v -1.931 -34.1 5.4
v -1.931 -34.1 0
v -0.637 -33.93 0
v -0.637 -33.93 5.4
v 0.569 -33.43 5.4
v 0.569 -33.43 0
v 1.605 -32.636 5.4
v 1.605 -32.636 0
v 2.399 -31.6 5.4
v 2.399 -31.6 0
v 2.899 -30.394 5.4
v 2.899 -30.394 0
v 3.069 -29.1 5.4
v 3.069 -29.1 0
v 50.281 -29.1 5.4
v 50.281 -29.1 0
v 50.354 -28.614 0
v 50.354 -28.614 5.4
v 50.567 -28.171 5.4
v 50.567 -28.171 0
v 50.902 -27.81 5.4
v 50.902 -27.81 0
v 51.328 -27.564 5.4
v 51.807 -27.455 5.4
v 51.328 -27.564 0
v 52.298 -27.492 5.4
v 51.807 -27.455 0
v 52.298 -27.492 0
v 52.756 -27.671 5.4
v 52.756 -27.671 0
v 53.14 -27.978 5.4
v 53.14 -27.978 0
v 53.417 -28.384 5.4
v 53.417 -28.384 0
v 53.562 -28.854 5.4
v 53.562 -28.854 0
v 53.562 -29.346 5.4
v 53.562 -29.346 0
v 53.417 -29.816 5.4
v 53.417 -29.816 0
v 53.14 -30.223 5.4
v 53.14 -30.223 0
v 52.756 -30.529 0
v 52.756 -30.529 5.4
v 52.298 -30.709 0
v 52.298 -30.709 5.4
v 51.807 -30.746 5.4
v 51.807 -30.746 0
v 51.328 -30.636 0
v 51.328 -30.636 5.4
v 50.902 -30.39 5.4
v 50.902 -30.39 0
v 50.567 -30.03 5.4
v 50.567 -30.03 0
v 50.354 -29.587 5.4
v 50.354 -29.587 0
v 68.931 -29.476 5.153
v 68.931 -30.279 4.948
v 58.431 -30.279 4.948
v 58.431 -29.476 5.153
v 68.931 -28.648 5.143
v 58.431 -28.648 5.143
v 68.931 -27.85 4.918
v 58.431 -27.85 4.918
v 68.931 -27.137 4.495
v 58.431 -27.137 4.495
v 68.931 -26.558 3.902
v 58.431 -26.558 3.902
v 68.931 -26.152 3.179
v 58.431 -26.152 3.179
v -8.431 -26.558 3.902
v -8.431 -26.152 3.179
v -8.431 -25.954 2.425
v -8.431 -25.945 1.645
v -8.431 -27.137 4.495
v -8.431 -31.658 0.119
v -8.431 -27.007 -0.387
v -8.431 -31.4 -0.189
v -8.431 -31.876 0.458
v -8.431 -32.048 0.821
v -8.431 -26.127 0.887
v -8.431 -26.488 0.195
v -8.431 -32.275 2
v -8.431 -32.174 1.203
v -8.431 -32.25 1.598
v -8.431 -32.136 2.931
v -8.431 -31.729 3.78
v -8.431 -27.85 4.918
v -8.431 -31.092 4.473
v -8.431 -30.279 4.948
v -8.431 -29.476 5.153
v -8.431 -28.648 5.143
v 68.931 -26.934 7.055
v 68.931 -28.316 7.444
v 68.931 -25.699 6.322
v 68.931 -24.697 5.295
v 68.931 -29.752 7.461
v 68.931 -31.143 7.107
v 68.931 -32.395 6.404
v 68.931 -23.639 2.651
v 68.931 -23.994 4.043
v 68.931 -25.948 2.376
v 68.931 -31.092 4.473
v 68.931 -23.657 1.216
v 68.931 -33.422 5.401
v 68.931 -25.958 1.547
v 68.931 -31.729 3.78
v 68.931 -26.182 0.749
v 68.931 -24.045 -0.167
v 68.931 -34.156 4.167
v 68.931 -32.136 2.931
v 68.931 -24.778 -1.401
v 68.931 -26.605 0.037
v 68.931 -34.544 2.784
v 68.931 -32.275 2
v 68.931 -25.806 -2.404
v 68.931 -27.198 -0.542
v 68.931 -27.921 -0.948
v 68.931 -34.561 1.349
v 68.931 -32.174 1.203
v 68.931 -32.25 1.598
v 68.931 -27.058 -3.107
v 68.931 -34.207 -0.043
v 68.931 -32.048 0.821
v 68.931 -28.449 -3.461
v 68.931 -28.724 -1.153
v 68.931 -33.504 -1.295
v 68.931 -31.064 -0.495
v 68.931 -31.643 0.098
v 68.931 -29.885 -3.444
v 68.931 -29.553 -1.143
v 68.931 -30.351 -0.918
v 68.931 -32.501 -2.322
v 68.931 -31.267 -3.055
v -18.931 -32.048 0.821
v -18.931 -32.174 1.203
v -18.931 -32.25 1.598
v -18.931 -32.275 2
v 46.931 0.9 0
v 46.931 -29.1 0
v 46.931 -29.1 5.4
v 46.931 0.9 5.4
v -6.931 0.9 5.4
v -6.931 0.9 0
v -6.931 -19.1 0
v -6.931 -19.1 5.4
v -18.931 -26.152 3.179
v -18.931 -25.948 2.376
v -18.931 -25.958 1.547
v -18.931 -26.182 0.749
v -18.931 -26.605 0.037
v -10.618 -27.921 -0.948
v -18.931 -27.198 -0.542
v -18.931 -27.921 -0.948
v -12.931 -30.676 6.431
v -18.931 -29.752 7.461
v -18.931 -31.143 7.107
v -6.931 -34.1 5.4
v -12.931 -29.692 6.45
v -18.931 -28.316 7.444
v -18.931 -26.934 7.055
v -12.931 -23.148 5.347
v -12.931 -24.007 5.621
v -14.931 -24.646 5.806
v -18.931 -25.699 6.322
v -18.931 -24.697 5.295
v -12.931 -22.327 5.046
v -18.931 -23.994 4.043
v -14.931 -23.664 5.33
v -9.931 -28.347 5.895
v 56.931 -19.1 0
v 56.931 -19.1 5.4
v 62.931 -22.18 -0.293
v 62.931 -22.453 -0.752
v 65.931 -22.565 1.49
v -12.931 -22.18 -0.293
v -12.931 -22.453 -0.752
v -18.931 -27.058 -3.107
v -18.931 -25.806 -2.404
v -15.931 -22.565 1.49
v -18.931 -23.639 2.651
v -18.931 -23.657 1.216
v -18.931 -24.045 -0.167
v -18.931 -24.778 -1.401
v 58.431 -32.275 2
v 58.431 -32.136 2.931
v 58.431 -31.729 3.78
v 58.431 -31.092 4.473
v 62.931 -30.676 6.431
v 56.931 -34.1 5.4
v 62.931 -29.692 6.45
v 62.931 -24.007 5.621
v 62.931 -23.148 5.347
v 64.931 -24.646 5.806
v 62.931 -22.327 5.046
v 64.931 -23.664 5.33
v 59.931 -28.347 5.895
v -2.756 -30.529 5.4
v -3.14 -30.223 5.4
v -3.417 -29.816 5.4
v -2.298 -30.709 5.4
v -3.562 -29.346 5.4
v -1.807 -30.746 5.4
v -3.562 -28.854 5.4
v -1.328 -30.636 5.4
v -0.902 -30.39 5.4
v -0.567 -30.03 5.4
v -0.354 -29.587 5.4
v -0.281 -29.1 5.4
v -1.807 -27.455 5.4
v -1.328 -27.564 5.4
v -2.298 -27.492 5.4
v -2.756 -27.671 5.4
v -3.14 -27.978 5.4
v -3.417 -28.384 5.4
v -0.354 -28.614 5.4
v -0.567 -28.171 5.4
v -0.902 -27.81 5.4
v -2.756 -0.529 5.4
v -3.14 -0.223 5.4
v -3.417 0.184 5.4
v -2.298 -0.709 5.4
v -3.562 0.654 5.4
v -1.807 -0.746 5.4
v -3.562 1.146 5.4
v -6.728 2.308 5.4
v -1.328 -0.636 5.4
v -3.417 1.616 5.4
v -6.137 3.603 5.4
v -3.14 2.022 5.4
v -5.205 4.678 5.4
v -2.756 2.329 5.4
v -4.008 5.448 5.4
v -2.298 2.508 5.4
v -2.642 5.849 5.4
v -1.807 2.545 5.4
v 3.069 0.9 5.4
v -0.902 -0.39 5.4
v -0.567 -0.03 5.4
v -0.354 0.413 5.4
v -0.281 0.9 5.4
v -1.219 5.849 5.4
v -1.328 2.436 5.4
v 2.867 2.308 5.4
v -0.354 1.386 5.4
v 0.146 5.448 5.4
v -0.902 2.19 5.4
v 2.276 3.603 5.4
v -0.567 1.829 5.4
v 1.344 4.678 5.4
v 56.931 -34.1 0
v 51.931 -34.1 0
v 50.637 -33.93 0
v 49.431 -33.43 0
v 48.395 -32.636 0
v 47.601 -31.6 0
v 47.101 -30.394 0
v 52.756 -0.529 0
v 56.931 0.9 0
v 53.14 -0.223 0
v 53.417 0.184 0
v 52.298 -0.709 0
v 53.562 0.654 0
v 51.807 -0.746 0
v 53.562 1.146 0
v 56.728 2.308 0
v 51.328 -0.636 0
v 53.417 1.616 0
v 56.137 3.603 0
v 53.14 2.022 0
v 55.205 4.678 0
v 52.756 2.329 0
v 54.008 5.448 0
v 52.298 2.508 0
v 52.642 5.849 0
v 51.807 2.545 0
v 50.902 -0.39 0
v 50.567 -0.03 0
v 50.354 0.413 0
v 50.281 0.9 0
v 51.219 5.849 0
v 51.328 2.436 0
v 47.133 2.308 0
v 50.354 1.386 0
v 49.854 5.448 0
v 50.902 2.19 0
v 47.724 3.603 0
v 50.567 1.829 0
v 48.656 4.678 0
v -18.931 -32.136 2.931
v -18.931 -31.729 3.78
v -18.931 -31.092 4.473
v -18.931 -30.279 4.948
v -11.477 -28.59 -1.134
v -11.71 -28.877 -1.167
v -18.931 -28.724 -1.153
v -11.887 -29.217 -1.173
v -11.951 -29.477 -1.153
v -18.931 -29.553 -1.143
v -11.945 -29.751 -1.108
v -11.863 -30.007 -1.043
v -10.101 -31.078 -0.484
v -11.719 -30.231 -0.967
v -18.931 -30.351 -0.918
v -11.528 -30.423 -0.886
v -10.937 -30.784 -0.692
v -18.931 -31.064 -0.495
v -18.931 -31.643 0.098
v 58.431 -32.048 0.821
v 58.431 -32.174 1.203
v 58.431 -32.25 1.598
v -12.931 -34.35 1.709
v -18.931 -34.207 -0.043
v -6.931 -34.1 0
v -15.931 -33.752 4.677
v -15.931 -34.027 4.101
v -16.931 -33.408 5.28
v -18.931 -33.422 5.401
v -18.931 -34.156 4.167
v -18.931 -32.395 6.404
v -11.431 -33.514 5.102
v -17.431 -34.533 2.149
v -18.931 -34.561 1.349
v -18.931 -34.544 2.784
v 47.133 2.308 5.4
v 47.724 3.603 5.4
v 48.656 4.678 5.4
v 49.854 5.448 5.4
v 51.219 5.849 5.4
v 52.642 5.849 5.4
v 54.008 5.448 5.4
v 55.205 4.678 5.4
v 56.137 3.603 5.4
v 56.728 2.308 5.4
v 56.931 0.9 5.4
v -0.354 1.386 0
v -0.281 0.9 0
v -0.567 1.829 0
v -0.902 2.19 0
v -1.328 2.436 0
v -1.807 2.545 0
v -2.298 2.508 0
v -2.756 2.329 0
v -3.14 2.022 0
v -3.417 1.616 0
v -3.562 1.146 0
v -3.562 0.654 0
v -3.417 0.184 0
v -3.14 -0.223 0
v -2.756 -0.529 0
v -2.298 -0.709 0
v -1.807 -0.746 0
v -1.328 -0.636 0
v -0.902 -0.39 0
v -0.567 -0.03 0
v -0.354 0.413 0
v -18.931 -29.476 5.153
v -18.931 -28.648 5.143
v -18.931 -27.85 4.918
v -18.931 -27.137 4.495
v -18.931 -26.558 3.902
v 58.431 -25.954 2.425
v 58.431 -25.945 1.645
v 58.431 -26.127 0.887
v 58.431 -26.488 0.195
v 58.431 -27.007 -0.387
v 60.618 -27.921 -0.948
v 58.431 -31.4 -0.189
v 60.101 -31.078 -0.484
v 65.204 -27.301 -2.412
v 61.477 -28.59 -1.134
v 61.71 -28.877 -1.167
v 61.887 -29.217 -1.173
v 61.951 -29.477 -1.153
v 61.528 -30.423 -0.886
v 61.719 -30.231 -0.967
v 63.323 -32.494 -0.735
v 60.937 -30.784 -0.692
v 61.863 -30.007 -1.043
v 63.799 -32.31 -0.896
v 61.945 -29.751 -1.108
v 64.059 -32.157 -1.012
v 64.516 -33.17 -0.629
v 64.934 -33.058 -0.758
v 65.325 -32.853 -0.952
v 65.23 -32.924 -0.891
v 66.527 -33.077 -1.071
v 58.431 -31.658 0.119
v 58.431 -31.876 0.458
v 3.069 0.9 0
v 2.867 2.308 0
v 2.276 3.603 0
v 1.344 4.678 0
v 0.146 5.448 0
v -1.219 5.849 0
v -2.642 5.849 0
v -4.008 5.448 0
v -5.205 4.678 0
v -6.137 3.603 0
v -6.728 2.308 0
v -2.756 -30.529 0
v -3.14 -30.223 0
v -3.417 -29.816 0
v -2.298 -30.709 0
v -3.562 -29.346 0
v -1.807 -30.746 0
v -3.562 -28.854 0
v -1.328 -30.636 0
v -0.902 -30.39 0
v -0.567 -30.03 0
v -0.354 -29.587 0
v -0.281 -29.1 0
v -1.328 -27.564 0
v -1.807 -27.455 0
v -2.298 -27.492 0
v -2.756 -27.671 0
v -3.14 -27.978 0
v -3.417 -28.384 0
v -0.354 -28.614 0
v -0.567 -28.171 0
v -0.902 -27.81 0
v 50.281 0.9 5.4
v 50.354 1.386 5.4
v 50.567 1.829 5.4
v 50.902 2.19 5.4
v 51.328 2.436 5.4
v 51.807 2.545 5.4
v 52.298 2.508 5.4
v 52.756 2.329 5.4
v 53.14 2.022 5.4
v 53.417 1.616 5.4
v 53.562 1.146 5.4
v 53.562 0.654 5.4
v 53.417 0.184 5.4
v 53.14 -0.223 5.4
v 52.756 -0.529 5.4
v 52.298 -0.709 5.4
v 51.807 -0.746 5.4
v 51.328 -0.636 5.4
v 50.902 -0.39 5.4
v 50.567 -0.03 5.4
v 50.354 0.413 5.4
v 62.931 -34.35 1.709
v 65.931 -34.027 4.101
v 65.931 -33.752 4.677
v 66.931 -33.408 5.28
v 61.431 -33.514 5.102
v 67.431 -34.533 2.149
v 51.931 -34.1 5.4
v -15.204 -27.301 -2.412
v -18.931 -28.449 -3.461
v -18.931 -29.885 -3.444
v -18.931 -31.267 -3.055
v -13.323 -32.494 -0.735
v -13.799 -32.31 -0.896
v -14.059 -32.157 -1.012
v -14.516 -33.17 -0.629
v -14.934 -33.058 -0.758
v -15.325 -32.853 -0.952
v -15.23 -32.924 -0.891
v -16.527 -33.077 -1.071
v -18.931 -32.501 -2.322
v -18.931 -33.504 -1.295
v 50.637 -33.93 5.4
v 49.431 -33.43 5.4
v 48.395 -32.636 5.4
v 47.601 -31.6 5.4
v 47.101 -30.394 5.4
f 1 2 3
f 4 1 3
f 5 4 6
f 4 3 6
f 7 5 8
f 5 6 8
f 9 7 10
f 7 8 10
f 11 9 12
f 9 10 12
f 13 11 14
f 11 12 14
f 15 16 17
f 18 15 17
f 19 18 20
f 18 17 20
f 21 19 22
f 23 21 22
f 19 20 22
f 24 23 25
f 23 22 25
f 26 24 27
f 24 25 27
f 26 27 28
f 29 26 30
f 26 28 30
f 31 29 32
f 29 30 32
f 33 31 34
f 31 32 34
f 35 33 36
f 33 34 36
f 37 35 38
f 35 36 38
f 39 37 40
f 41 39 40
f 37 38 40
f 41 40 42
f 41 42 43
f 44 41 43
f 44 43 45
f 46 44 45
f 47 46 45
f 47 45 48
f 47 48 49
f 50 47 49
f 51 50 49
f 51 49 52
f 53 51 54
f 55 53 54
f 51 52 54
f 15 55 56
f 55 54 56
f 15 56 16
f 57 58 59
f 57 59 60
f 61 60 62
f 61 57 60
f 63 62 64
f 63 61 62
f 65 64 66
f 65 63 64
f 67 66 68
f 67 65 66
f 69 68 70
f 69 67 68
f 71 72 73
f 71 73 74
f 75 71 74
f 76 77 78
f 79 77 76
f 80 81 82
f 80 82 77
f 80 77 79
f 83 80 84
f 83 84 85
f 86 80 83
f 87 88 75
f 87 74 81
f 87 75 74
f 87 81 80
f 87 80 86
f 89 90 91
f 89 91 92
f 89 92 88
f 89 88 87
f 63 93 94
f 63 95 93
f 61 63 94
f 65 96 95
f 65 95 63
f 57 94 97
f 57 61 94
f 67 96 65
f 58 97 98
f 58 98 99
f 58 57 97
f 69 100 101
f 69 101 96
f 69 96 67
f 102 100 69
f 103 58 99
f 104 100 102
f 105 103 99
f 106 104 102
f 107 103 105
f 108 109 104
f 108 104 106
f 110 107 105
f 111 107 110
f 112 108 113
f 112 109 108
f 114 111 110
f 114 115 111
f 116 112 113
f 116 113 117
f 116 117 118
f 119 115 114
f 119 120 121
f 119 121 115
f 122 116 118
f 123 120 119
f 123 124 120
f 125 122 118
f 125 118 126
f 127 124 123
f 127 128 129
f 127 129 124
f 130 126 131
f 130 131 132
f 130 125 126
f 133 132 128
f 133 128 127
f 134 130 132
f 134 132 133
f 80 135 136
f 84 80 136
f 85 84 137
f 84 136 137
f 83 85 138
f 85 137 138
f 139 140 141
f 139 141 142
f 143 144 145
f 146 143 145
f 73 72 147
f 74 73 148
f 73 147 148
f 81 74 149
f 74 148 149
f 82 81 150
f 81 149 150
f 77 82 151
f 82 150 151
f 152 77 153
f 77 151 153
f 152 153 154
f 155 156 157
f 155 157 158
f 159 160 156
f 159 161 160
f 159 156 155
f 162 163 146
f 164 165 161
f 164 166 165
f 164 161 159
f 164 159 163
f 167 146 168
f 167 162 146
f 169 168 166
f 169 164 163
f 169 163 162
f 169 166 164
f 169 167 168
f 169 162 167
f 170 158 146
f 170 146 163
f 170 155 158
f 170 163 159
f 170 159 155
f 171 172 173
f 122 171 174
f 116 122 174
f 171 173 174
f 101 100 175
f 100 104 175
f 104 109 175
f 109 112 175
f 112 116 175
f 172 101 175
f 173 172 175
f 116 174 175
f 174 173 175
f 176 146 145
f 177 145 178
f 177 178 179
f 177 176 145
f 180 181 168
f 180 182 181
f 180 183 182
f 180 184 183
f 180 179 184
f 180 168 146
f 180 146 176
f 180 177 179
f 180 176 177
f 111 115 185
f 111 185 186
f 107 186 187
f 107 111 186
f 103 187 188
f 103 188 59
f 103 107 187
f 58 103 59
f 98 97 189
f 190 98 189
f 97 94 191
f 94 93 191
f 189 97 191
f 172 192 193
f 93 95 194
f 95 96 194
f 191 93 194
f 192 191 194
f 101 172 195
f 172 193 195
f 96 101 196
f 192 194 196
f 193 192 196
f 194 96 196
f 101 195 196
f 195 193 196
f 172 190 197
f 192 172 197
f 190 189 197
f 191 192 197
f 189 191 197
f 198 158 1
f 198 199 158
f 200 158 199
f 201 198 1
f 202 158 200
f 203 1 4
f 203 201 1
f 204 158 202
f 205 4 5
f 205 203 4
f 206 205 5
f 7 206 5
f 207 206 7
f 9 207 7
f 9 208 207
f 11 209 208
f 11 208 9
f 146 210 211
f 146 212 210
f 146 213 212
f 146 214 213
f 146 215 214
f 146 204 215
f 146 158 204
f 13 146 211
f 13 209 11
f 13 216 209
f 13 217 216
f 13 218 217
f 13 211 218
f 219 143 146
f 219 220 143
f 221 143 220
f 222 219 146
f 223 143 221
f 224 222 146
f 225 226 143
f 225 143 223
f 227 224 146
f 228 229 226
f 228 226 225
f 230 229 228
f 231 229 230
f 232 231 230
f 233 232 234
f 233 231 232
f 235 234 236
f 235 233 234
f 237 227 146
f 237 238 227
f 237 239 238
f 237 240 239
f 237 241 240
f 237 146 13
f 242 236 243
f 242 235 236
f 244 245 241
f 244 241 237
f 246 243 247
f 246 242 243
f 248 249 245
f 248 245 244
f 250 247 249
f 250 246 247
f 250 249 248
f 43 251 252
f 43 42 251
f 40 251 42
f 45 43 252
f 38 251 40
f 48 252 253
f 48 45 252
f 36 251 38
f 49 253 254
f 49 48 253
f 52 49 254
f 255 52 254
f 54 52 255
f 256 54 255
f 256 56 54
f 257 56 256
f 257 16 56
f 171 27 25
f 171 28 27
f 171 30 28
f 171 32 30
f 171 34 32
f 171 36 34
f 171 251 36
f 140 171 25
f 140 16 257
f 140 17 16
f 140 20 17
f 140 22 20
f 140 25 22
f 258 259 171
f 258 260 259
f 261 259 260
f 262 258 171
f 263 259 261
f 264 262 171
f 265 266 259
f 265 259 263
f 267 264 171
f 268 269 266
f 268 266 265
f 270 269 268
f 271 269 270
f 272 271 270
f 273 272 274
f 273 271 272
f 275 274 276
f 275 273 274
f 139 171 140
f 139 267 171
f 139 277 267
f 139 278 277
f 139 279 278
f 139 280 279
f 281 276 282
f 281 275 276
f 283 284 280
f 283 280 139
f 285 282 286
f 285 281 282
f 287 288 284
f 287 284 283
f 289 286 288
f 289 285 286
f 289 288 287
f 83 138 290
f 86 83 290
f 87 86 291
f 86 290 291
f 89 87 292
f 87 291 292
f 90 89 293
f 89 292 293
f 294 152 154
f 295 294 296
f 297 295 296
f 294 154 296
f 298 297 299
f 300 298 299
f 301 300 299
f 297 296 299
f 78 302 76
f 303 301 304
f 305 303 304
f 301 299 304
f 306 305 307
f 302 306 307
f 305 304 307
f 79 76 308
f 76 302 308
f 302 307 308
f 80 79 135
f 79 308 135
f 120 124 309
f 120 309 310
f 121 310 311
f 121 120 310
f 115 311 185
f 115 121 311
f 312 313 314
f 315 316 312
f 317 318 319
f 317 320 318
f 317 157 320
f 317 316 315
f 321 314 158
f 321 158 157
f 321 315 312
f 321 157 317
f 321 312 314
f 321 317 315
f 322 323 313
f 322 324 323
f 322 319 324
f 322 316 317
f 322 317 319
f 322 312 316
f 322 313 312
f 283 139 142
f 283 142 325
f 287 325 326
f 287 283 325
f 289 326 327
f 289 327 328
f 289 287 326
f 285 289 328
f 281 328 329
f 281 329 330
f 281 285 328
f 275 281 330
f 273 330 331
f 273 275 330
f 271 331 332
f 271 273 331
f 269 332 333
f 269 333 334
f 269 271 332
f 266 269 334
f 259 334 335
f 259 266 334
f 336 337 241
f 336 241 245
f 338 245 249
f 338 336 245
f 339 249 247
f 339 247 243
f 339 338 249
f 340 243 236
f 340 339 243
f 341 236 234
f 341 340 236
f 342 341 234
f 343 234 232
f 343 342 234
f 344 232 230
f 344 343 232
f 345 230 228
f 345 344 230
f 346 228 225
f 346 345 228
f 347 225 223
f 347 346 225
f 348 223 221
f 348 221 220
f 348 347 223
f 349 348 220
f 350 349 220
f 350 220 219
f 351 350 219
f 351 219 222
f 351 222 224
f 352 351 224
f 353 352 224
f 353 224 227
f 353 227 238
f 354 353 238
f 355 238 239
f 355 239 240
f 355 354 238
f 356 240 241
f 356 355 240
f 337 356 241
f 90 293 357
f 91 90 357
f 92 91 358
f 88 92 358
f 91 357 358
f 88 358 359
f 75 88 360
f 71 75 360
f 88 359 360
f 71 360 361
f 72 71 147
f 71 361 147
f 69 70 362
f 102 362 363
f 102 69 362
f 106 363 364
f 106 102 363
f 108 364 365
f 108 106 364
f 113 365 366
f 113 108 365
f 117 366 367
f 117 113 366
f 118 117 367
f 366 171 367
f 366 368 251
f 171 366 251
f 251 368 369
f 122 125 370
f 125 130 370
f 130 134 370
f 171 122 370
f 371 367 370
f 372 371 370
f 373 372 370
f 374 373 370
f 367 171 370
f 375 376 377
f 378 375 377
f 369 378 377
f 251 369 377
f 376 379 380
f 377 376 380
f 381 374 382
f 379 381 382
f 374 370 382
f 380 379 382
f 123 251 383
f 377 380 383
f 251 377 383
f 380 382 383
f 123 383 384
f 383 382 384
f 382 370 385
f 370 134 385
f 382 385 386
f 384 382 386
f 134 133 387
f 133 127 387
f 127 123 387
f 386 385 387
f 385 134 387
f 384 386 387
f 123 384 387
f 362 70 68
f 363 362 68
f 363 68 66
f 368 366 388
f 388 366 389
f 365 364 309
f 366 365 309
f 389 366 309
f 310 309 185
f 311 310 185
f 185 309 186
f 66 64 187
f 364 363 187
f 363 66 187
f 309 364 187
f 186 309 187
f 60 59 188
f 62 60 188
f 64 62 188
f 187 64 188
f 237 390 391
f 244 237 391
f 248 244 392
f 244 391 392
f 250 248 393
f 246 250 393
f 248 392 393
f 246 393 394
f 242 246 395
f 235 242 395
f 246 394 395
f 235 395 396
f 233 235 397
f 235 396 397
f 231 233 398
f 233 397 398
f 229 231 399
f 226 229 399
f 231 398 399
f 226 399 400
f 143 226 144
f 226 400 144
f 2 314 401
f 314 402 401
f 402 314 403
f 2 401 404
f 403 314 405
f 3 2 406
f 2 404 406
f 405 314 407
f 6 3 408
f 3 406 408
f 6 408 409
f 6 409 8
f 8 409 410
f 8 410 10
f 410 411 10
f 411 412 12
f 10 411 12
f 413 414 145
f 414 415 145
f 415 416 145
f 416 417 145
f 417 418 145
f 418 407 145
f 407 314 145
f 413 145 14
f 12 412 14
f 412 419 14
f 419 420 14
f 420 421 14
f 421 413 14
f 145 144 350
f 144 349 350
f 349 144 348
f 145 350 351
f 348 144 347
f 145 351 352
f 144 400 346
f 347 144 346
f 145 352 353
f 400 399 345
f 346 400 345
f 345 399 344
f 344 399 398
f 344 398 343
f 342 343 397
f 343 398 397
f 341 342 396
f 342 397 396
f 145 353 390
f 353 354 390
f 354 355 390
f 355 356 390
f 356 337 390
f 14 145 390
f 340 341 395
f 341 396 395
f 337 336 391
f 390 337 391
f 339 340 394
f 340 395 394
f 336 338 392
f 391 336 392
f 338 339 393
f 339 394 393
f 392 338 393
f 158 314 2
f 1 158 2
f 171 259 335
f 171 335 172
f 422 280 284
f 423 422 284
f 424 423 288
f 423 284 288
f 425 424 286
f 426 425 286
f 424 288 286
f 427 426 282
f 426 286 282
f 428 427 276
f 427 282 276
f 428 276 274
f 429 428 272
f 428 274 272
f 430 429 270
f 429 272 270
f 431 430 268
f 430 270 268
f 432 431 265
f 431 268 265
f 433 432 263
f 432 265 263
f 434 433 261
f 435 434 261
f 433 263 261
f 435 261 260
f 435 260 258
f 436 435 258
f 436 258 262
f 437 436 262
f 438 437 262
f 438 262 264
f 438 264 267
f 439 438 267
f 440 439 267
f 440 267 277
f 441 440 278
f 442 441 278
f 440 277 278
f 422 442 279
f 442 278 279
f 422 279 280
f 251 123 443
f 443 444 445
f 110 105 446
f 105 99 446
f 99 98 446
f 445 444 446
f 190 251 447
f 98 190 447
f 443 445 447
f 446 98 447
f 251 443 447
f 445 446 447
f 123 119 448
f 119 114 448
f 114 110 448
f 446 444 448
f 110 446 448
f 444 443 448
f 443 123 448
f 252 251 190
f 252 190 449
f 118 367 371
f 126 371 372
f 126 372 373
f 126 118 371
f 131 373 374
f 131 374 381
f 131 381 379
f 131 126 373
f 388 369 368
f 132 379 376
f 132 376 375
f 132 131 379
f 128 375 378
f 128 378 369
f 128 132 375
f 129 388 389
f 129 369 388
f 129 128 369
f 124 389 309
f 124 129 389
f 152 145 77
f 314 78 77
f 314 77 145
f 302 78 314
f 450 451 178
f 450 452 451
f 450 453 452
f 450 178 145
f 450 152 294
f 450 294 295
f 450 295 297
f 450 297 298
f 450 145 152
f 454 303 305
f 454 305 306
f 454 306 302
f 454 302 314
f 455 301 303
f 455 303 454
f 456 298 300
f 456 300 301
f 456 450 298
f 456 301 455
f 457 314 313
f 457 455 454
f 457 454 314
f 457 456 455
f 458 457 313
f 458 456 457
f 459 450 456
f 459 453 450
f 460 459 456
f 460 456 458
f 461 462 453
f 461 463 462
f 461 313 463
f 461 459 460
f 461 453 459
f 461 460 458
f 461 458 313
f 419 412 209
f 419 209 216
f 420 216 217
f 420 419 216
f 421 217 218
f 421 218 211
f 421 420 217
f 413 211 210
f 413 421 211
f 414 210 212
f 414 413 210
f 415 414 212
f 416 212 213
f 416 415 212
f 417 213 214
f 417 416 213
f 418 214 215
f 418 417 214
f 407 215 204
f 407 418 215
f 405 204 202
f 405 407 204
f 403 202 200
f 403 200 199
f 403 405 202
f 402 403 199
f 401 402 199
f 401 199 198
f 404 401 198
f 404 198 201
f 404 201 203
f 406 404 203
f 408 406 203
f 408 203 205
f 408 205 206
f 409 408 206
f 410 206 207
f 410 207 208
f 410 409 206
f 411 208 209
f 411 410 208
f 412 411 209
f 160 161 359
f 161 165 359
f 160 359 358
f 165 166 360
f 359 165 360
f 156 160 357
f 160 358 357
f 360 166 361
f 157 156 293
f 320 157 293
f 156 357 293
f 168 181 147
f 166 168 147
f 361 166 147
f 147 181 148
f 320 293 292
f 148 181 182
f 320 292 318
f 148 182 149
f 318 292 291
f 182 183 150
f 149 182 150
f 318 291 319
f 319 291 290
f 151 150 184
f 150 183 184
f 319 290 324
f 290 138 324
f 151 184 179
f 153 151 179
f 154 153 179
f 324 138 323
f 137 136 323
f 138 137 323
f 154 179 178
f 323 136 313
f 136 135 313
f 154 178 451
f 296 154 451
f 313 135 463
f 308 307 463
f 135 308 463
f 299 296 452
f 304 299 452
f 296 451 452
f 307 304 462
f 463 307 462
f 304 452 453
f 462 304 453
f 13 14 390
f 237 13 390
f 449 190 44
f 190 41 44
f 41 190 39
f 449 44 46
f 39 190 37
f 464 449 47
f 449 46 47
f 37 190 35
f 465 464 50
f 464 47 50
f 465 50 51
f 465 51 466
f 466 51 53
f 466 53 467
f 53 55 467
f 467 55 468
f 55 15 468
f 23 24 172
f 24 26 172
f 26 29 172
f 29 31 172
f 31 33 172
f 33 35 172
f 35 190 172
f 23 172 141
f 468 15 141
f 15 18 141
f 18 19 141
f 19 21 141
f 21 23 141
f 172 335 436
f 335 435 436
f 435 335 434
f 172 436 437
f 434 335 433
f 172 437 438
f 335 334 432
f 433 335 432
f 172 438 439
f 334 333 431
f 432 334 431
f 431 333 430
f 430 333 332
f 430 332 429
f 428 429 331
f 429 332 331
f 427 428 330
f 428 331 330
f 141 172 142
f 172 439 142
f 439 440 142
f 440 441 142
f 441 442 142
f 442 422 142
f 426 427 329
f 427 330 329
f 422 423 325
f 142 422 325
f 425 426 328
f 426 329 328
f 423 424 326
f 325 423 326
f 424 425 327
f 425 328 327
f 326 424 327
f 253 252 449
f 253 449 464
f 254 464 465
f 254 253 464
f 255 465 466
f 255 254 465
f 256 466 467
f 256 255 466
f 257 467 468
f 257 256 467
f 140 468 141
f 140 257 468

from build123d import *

# Parameters (mm, degrees)
F0_R     = 1.65
F1_DEPTH = 5.4
F2_W     = 15
F2_H     = 5.4
F7_DEPTH = 10.5


# Not quite as in the source:
# - the arcs of a loft's sections are written as splines that run evenly, so that the points pair up as in the source's solid


with BuildPart() as f1:
    # F0 (on Top) → F1 (new body)
    with BuildSketch(Plane.XY):
        with BuildLine():
            ThreePointArc((3.0692669051, 0.8996940404), (-1.9307330949, 5.8996940404), (-6.9307330949, 0.8996940404))
            Line((-6.9307330949, 0.8996940404), (-6.9307330949, -29.1003059596))
            Line((-6.9307330949, -29.1003059596), (-6.9307330949, -34.1003059596))
            Line((-6.9307330949, -34.1003059596), (-1.9307330949, -34.1003059596))
            ThreePointArc((-1.9307330949, -34.1003059596), (1.604800811, -32.6358398655), (3.0692669051, -29.1003059596))
            Line((3.0692669051, -29.1003059596), (3.0692669051, 0.8996940404))
        make_face()
        with Locations((-1.9307330949, -29.1003059596)):
            Circle(F0_R, mode=Mode.SUBTRACT)
        with Locations((-1.9307330949, 0.8996940404)):
            Circle(F0_R, mode=Mode.SUBTRACT)
    extrude(amount=F1_DEPTH)

    # F2 (on face) → F5 section 0
    with BuildSketch(Plane(origin=(-6.9307330949, 0, 0), x_dir=(0, -1, 0), z_dir=(-1, 0, 0))):
        with Locations((26.6003059596, 2.7)):
            Rectangle(F2_W, F2_H)
    # F4 (on offset) → F5 section 1
    with BuildSketch(Plane(origin=(-18.9307330949, 0, 0), x_dir=(0, -1, 0), z_dir=(-1, 0, 0))):
        with BuildLine():
            add(Edge.make_bspline(
                [(34.2069277595, -0.0426487199), (34.4743098516, 0.6258065105), (34.6086750437, 1.3471634111), (34.5911192444, 2.7869530163), (34.4392051605, 3.5048192253), (33.8720020889, 4.8282930591), (33.4569362713, 5.4333799536), (32.4264374532, 6.4390511222), (31.81140991, 6.8392397077), (31.1429546795, 7.1066217999)],
                knots=[0, 0, 0, 0, 0.25, 0.25, 0.5, 0.5, 0.75, 0.75, 1, 1, 1, 1], degree=3))
            add(Edge.make_bspline(
                [(31.1429546795, 7.1066217999), (30.4744994491, 7.3740038921), (29.7531425485, 7.5083690841), (28.3133529433, 7.4908132848), (27.5954867343, 7.3388992009), (26.2720129005, 6.7716961293), (25.666926006, 6.3566303117), (24.6612548374, 5.3261314936), (24.2610662519, 4.7111039504), (23.9936841597, 4.0426487199)],
                knots=[0, 0, 0, 0, 0.25, 0.25, 0.5, 0.5, 0.75, 0.75, 1, 1, 1, 1], degree=3))
            add(Edge.make_bspline(
                [(23.9936841597, 4.0426487199), (23.7263020675, 3.3741934895), (23.5919368755, 2.6528365889), (23.6094926748, 1.2130469837), (23.7614067587, 0.4951807747), (24.3286098303, -0.8282930591), (24.7436756479, -1.4333799536), (25.774174466, -2.4390511222), (26.3892020092, -2.8392397077), (27.0576572396, -3.1066217999)],
                knots=[0, 0, 0, 0, 0.25, 0.25, 0.5, 0.5, 0.75, 0.75, 1, 1, 1, 1], degree=3))
            add(Edge.make_bspline(
                [(27.0576572396, -3.1066217999), (27.7261124701, -3.3740038921), (28.4474693707, -3.5083690841), (29.8872589759, -3.4908132848), (30.6051251848, -3.3388992009), (31.9285990187, -2.7716961293), (32.5336859132, -2.3566303117), (33.5393570818, -1.3261314936), (33.9395456673, -0.7111039504), (34.2069277595, -0.0426487199)],
                knots=[0, 0, 0, 0, 0.25, 0.25, 0.5, 0.5, 0.75, 0.75, 1, 1, 1, 1], degree=3))
        make_face()
    loft(ruled=True)

    # F6 (on face) → F7 (cut)
    with BuildSketch(Plane(origin=(-18.9307330949, 0, 0), x_dir=(0, -1, 0), z_dir=(-1, 0, 0))):
        with BuildLine():
            ThreePointArc((26.152392466, 3.1791653974), (26.1820204893, 0.749306227), (27.9211405622, -0.9479134936))
            Line((27.9211405622, -0.9479134936), (29.1003059596, 2))
            Line((29.1003059596, 2), (26.152392466, 3.1791653974))
        make_face()
        with BuildLine():
            Line((29.1003059596, 2), (27.9211405622, -0.9479134936))
            ThreePointArc((27.9211405622, -0.9479134936), (30.3509997326, -0.9182854703), (32.0482194531, 0.8208346026))
            Line((32.0482194531, 0.8208346026), (29.1003059596, 2))
        make_face()
        with BuildLine():
            Line((26.152392466, 3.1791653974), (29.1003059596, 2))
            Line((29.1003059596, 2), (30.279471357, 4.9479134936))
            ThreePointArc((30.279471357, 4.9479134936), (27.8496121866, 4.9182854703), (26.152392466, 3.1791653974))
        make_face()
        with BuildLine():
            Line((30.279471357, 4.9479134936), (29.1003059596, 2))
            Line((29.1003059596, 2), (32.0482194531, 0.8208346026))
            ThreePointArc((32.0482194531, 0.8208346026), (32.2180174875, 1.3995836203), (32.2753059596, 2))
            ThreePointArc((32.2753059596, 2), (31.7294194163, 3.7799964695), (30.279471357, 4.9479134936))
        make_face()
    extrude(amount=-F7_DEPTH, mode=Mode.SUBTRACT)


with BuildPart() as f9_1:
    # F9: instance of F1
    add(f1.part.mirror(Plane.YZ.offset(25)))


solid = Compound([f1.part, f9_1.part])
